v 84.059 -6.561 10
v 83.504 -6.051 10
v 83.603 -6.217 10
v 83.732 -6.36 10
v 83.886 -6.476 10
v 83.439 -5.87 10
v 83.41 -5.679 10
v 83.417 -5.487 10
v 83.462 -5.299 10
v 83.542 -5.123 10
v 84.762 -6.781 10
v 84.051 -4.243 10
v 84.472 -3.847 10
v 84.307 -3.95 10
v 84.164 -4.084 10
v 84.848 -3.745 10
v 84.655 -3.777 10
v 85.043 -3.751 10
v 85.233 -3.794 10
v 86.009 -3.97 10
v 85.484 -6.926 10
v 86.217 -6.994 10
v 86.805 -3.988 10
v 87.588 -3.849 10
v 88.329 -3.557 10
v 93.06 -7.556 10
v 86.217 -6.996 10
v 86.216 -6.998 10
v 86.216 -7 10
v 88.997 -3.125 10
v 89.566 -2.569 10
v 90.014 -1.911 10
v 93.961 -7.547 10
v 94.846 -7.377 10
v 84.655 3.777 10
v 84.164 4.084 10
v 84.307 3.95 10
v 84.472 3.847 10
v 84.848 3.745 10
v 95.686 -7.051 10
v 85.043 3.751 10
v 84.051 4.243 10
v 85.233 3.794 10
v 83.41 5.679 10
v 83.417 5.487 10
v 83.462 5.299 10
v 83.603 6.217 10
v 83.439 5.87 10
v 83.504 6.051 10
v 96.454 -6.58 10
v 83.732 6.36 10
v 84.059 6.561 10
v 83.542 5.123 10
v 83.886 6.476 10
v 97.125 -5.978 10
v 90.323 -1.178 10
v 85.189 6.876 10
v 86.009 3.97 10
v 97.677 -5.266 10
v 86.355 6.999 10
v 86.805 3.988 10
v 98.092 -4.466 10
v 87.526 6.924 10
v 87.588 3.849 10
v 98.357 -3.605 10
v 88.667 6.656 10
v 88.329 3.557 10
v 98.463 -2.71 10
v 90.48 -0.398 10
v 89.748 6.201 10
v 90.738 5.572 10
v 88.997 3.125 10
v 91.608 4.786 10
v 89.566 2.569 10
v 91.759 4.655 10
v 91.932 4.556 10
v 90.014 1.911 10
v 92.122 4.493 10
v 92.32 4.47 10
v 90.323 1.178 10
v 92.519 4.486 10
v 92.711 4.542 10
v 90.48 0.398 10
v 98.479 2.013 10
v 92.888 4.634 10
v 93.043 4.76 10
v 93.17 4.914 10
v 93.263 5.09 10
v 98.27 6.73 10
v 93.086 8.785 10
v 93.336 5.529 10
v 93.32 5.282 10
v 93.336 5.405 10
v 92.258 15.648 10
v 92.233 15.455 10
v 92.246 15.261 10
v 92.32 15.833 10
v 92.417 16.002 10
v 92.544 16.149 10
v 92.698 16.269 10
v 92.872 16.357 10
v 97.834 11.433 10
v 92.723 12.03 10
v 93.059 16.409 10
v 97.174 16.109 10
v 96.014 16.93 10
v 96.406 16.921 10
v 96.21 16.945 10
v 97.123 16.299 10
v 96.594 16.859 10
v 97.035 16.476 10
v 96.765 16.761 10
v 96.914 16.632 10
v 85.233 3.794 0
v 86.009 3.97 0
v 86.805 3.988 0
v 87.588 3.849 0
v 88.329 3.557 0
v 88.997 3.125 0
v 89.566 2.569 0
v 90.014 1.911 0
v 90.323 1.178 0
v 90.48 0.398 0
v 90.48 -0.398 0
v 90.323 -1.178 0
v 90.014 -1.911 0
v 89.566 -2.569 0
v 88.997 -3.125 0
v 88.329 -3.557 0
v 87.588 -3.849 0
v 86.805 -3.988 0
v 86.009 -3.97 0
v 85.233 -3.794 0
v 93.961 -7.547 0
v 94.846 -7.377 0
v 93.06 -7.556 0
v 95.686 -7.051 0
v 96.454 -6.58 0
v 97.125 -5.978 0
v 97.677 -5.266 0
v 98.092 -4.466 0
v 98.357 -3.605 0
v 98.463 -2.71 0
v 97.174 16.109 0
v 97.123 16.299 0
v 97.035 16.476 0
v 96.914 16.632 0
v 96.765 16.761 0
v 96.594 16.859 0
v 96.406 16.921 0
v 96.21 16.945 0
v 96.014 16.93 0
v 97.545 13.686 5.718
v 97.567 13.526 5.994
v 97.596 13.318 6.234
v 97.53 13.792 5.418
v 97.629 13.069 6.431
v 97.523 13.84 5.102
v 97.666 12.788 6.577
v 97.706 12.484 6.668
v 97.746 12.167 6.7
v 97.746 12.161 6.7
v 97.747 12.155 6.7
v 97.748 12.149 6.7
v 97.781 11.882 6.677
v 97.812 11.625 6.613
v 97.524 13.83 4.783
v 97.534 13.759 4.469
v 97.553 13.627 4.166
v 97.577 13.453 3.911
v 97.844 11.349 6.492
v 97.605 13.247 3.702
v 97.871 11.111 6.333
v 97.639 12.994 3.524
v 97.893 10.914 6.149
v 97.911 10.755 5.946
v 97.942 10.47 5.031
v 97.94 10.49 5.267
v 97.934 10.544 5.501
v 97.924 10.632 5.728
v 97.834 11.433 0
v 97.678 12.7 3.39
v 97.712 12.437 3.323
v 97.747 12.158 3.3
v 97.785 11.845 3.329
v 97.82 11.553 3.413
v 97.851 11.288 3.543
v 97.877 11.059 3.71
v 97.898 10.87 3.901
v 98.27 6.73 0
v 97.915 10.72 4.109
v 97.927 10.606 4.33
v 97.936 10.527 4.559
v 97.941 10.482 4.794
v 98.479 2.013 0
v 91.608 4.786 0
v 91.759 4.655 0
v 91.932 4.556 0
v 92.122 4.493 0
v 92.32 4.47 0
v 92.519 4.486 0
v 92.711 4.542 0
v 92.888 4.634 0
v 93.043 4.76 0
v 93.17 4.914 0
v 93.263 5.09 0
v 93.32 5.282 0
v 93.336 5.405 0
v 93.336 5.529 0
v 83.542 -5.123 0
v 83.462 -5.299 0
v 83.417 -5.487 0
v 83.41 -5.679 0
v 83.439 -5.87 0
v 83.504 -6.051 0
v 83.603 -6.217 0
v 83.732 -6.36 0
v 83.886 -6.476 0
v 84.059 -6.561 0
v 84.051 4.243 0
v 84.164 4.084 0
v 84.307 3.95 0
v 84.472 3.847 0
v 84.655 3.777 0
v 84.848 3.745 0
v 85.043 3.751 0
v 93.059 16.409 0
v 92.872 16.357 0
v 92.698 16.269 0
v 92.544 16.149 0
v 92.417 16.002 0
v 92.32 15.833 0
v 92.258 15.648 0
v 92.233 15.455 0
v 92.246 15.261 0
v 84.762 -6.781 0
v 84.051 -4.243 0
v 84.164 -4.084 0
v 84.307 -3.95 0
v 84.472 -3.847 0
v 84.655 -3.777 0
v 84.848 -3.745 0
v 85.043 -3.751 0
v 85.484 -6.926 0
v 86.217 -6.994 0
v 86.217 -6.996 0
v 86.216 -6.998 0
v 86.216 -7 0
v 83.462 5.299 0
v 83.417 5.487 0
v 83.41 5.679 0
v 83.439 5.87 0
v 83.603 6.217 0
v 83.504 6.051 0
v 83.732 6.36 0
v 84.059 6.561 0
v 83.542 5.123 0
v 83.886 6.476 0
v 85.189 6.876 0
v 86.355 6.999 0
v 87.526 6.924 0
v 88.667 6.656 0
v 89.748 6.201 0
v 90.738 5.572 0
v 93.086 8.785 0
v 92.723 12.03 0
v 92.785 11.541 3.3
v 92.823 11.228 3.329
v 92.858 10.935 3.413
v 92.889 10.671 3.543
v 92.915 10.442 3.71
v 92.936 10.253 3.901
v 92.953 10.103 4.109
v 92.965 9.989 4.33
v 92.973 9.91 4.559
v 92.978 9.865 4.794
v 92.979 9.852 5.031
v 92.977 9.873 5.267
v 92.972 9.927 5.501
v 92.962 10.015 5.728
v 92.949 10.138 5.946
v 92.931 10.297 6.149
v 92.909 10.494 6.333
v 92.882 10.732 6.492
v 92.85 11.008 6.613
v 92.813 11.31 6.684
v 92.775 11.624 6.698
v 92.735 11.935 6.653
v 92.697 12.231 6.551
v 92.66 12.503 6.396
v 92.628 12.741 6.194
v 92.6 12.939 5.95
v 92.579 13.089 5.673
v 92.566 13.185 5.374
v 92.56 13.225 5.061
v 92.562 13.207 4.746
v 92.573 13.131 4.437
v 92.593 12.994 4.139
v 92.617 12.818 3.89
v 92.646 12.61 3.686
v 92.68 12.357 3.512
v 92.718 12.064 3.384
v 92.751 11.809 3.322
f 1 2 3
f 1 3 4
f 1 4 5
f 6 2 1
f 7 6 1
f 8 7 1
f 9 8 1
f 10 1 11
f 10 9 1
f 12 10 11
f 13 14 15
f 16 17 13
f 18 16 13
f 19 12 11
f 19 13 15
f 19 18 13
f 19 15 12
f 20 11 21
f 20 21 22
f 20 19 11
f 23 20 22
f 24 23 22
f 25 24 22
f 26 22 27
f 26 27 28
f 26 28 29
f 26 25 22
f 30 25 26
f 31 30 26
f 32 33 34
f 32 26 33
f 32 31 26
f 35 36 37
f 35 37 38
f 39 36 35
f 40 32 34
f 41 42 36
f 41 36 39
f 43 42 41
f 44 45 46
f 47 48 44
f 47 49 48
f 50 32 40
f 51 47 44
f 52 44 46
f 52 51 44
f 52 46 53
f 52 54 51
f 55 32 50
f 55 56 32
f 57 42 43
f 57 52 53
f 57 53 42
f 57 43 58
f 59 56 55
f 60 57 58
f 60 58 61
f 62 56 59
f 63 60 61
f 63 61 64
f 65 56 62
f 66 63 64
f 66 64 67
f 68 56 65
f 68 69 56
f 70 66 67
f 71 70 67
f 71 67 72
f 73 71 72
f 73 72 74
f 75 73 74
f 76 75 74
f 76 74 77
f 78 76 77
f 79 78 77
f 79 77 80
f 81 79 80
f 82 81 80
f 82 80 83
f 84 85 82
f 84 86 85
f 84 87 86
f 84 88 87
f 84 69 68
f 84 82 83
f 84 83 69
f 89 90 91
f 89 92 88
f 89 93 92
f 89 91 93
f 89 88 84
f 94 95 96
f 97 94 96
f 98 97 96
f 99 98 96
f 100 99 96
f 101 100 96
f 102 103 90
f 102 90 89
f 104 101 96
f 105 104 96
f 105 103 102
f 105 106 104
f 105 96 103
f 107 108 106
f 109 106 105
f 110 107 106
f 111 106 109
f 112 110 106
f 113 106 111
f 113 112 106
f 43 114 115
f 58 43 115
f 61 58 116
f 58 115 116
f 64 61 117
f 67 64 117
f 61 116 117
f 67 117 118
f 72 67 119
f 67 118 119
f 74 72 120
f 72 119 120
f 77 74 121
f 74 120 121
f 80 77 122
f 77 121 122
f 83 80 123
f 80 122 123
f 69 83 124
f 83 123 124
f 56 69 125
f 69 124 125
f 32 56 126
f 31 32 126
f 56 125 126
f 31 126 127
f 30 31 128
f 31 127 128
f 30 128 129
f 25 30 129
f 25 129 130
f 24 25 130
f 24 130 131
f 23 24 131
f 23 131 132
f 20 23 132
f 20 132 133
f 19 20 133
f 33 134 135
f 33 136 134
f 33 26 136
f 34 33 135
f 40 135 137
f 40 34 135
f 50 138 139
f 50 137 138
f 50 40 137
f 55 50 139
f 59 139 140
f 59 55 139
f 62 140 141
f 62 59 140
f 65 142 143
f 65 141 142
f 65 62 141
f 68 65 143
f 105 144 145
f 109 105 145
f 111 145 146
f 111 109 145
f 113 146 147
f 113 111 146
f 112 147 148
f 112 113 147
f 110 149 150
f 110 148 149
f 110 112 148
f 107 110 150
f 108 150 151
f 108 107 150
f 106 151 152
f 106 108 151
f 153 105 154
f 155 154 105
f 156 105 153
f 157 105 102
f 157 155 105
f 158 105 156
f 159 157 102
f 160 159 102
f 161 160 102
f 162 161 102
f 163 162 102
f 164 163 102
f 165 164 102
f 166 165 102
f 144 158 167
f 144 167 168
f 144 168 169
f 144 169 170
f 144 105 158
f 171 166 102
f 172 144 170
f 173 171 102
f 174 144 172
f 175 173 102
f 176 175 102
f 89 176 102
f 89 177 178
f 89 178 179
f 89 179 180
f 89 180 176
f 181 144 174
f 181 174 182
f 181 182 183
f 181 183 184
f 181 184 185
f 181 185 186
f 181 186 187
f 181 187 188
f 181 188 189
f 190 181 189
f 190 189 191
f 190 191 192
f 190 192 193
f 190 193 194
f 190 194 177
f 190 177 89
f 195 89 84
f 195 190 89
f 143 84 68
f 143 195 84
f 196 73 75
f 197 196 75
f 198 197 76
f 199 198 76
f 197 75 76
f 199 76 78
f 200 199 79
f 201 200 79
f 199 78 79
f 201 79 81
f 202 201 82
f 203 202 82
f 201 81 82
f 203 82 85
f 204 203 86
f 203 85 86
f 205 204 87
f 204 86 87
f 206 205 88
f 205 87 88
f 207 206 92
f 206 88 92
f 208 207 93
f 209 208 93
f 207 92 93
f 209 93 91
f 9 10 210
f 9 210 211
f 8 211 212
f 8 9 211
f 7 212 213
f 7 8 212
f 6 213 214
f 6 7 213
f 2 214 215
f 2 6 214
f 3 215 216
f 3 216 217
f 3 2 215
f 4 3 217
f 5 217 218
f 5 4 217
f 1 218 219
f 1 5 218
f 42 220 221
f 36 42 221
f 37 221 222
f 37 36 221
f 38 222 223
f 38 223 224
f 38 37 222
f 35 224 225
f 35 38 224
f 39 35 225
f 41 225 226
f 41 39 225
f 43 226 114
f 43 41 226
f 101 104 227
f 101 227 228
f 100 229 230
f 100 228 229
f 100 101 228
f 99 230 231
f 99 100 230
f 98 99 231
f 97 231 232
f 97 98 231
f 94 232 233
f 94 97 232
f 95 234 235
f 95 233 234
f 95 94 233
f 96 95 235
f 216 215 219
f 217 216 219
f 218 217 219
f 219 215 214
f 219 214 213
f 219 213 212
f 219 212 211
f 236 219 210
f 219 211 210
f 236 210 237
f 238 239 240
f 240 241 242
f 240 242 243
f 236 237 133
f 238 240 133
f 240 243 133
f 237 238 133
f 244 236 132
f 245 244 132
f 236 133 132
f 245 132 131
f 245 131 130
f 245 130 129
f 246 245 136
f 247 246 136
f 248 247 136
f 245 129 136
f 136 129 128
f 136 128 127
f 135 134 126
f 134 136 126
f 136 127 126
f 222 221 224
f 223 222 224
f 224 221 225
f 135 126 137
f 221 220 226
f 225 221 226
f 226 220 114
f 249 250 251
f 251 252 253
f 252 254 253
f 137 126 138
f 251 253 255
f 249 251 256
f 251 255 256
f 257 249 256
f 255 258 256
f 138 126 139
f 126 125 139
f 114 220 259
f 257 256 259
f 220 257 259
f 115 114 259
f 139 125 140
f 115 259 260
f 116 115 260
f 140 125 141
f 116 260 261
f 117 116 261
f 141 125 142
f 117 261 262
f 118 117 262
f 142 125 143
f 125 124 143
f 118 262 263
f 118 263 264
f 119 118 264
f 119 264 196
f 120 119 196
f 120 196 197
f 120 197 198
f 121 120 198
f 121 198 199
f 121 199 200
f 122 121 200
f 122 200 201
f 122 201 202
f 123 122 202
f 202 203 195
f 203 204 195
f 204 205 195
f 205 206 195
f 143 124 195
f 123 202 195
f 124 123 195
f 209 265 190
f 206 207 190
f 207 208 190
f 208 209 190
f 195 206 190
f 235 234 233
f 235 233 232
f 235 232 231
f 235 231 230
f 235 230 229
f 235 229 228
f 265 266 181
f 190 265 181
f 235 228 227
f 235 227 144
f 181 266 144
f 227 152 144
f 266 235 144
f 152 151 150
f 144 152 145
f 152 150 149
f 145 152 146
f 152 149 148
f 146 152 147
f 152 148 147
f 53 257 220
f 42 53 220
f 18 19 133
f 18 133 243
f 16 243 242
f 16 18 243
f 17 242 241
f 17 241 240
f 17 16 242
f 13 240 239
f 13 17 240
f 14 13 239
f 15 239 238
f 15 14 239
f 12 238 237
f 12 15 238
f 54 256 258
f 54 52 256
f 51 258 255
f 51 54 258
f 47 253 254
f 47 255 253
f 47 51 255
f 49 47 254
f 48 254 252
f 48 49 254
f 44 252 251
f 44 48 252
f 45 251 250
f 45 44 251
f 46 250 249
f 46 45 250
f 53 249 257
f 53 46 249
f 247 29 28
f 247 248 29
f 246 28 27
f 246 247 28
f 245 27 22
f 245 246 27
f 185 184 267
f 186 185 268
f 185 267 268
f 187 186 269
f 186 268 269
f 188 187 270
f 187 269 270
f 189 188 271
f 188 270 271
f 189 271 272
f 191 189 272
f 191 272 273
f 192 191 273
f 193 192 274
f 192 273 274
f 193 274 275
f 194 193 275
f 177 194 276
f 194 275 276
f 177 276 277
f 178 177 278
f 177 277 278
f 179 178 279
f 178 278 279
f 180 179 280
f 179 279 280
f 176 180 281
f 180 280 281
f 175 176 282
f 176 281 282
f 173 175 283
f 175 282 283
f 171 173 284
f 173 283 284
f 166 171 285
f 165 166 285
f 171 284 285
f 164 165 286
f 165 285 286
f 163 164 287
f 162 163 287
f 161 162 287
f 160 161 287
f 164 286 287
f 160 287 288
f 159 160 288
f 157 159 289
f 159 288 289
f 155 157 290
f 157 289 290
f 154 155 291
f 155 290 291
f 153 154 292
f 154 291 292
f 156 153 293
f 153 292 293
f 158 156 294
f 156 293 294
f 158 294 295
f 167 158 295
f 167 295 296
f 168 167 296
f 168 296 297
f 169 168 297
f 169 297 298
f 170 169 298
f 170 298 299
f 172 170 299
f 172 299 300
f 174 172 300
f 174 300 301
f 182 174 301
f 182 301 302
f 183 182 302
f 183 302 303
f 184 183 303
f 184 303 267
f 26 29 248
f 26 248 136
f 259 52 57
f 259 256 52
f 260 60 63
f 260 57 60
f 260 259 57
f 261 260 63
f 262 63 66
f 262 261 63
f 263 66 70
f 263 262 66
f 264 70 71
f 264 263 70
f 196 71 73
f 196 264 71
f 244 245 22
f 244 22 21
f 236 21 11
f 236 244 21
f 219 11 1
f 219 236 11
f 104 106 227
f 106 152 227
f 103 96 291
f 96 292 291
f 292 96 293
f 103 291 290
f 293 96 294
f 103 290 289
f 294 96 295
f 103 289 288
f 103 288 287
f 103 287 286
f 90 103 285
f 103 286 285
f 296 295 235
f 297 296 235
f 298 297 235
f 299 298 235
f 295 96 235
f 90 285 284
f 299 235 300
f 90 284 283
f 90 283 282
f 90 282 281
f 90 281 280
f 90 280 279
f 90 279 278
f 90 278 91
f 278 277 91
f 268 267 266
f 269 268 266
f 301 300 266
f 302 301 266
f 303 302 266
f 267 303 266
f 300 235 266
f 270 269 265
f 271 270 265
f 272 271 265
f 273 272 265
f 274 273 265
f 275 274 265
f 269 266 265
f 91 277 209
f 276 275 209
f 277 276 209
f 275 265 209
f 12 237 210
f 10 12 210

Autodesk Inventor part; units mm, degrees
ref_plane "YZ Plane" through (0, 0, 0) normal (1, 0, 0) x (0, 1, 0)
ref_plane "XZ Plane" through (0, 0, 0) normal (0, 1, 0) x (-1, 0, 0)
sketch "スケッチ1" plane through (0, 0, 0) normal (0, 0, 1) x (1, 0, 0)
  circle A0 centre (0, 0) radius 98.5
  circle A1 centre (0, 0) radius 86.5
  circle A2 centre (86.5, 0) radius 4
  circle A3 centre (86.5, 0) radius 7
  line L0 (0, 0) -> (98.5, 0)
  circle A4 centre (0, 0) radius 93.5
  line L1 (0, 0) -> (97.003564, 17.104346)
  line L2 (0, 0) -> (98.17694, -7.971098)
  line L3 (86.5, 0) -> (83, 6.062178)
  line L4 (86.5, 0) -> (83, -6.062178)
  line L5 (97.746748, 12.158256) -> (0, 0)
  point P0 (84.5, -3.464102)
  point P1 (83, -6.062178)
  point P2 (86.216763, -6.994267)
  point P3 (86.216298, -7)
  point P4 (92.079525, 16.236105)
  point P5 (93.5, 0)
  point P6 (84.5, 3.464102)
  dimension "d1" = 173
  dimension "d3" = 14
  dimension "d0" = 197
  dimension "d2" = 8
  dimension "d4" = 187
  dimension "d5" = 10
  dimension "d6" = 60
  dimension "d11" = 5
  dimension "d20" = 7.09
sketch "スケッチ1 outline for 押し出し1" plane through (0, 0, 0) normal (0, 0, 1) x (1, 0, 0)
  arc A0 (84.5, 3.464102) -> (84.5, -3.464102) centre (86.5, 0) cw
  line L0 (83, 6.062178) -> (84.5, 3.464102)
  arc A1 (93.5, 0) -> (83, 6.062178) centre (86.5, 0) ccw
  arc A2 (92.079525, 16.236105) -> (93.5, 0) centre (0, 0) cw
  line L1 (97.003564, 17.104346) -> (92.079525, 16.236105)
  arc A3 (98.17694, -7.971098) -> (97.003564, 17.104346) centre (0, 0) ccw
  line L2 (86.216298, -7) -> (98.17694, -7.971098)
  arc A4 (86.216763, -6.994267) -> (86.216298, -7) centre (-0.000023, 0.000002) cw
  arc A5 (83, -6.062178) -> (86.216763, -6.994267) centre (86.5, 0) ccw
  line L3 (84.5, -3.464102) -> (83, -6.062178)
extrude "押し出し1" add sketch "スケッチ1 outline for 押し出し1" along normal blind 10
ref_plane "作業平面1" through (97.746748, 12.158256, 0) normal (0.9923528, 0.1234341, 0) x (-0.1234341, 0.9923528, 0)
sketch "スケッチ2" plane through (97.746748, 12.158256, 0) normal (0.9923528, 0.1234341, 0) x (-0.1234341, 0.9923528, 0)
  line L0 (5, 10) -> (-20.028521, 10)
  point P0 (0, 0)
  point P1 (0, 5)
  dimension "d12" = 5
hole "穴1" at (97.746748, 12.158256, 5) direction (-0.9923528, -0.1234341, 0) diameter 3.4 end through all
fillet "フィレット1" radius 1 7 edges at (83, -6.0622, 5) (84.5, -3.4641, 5) (84.5, 3.4641, 5) (83, 6.0622, 5) (93.5, 0, 5) (92.0795, 16.2361, 5) (97.0036, 17.1043, 5)
fillet "フィレット2" radius 5 1 edges at (98.1769, -7.9711, 5)
properties part number "TH22_3DP_cover_fixer_sn" material "ABS プラスチック"
